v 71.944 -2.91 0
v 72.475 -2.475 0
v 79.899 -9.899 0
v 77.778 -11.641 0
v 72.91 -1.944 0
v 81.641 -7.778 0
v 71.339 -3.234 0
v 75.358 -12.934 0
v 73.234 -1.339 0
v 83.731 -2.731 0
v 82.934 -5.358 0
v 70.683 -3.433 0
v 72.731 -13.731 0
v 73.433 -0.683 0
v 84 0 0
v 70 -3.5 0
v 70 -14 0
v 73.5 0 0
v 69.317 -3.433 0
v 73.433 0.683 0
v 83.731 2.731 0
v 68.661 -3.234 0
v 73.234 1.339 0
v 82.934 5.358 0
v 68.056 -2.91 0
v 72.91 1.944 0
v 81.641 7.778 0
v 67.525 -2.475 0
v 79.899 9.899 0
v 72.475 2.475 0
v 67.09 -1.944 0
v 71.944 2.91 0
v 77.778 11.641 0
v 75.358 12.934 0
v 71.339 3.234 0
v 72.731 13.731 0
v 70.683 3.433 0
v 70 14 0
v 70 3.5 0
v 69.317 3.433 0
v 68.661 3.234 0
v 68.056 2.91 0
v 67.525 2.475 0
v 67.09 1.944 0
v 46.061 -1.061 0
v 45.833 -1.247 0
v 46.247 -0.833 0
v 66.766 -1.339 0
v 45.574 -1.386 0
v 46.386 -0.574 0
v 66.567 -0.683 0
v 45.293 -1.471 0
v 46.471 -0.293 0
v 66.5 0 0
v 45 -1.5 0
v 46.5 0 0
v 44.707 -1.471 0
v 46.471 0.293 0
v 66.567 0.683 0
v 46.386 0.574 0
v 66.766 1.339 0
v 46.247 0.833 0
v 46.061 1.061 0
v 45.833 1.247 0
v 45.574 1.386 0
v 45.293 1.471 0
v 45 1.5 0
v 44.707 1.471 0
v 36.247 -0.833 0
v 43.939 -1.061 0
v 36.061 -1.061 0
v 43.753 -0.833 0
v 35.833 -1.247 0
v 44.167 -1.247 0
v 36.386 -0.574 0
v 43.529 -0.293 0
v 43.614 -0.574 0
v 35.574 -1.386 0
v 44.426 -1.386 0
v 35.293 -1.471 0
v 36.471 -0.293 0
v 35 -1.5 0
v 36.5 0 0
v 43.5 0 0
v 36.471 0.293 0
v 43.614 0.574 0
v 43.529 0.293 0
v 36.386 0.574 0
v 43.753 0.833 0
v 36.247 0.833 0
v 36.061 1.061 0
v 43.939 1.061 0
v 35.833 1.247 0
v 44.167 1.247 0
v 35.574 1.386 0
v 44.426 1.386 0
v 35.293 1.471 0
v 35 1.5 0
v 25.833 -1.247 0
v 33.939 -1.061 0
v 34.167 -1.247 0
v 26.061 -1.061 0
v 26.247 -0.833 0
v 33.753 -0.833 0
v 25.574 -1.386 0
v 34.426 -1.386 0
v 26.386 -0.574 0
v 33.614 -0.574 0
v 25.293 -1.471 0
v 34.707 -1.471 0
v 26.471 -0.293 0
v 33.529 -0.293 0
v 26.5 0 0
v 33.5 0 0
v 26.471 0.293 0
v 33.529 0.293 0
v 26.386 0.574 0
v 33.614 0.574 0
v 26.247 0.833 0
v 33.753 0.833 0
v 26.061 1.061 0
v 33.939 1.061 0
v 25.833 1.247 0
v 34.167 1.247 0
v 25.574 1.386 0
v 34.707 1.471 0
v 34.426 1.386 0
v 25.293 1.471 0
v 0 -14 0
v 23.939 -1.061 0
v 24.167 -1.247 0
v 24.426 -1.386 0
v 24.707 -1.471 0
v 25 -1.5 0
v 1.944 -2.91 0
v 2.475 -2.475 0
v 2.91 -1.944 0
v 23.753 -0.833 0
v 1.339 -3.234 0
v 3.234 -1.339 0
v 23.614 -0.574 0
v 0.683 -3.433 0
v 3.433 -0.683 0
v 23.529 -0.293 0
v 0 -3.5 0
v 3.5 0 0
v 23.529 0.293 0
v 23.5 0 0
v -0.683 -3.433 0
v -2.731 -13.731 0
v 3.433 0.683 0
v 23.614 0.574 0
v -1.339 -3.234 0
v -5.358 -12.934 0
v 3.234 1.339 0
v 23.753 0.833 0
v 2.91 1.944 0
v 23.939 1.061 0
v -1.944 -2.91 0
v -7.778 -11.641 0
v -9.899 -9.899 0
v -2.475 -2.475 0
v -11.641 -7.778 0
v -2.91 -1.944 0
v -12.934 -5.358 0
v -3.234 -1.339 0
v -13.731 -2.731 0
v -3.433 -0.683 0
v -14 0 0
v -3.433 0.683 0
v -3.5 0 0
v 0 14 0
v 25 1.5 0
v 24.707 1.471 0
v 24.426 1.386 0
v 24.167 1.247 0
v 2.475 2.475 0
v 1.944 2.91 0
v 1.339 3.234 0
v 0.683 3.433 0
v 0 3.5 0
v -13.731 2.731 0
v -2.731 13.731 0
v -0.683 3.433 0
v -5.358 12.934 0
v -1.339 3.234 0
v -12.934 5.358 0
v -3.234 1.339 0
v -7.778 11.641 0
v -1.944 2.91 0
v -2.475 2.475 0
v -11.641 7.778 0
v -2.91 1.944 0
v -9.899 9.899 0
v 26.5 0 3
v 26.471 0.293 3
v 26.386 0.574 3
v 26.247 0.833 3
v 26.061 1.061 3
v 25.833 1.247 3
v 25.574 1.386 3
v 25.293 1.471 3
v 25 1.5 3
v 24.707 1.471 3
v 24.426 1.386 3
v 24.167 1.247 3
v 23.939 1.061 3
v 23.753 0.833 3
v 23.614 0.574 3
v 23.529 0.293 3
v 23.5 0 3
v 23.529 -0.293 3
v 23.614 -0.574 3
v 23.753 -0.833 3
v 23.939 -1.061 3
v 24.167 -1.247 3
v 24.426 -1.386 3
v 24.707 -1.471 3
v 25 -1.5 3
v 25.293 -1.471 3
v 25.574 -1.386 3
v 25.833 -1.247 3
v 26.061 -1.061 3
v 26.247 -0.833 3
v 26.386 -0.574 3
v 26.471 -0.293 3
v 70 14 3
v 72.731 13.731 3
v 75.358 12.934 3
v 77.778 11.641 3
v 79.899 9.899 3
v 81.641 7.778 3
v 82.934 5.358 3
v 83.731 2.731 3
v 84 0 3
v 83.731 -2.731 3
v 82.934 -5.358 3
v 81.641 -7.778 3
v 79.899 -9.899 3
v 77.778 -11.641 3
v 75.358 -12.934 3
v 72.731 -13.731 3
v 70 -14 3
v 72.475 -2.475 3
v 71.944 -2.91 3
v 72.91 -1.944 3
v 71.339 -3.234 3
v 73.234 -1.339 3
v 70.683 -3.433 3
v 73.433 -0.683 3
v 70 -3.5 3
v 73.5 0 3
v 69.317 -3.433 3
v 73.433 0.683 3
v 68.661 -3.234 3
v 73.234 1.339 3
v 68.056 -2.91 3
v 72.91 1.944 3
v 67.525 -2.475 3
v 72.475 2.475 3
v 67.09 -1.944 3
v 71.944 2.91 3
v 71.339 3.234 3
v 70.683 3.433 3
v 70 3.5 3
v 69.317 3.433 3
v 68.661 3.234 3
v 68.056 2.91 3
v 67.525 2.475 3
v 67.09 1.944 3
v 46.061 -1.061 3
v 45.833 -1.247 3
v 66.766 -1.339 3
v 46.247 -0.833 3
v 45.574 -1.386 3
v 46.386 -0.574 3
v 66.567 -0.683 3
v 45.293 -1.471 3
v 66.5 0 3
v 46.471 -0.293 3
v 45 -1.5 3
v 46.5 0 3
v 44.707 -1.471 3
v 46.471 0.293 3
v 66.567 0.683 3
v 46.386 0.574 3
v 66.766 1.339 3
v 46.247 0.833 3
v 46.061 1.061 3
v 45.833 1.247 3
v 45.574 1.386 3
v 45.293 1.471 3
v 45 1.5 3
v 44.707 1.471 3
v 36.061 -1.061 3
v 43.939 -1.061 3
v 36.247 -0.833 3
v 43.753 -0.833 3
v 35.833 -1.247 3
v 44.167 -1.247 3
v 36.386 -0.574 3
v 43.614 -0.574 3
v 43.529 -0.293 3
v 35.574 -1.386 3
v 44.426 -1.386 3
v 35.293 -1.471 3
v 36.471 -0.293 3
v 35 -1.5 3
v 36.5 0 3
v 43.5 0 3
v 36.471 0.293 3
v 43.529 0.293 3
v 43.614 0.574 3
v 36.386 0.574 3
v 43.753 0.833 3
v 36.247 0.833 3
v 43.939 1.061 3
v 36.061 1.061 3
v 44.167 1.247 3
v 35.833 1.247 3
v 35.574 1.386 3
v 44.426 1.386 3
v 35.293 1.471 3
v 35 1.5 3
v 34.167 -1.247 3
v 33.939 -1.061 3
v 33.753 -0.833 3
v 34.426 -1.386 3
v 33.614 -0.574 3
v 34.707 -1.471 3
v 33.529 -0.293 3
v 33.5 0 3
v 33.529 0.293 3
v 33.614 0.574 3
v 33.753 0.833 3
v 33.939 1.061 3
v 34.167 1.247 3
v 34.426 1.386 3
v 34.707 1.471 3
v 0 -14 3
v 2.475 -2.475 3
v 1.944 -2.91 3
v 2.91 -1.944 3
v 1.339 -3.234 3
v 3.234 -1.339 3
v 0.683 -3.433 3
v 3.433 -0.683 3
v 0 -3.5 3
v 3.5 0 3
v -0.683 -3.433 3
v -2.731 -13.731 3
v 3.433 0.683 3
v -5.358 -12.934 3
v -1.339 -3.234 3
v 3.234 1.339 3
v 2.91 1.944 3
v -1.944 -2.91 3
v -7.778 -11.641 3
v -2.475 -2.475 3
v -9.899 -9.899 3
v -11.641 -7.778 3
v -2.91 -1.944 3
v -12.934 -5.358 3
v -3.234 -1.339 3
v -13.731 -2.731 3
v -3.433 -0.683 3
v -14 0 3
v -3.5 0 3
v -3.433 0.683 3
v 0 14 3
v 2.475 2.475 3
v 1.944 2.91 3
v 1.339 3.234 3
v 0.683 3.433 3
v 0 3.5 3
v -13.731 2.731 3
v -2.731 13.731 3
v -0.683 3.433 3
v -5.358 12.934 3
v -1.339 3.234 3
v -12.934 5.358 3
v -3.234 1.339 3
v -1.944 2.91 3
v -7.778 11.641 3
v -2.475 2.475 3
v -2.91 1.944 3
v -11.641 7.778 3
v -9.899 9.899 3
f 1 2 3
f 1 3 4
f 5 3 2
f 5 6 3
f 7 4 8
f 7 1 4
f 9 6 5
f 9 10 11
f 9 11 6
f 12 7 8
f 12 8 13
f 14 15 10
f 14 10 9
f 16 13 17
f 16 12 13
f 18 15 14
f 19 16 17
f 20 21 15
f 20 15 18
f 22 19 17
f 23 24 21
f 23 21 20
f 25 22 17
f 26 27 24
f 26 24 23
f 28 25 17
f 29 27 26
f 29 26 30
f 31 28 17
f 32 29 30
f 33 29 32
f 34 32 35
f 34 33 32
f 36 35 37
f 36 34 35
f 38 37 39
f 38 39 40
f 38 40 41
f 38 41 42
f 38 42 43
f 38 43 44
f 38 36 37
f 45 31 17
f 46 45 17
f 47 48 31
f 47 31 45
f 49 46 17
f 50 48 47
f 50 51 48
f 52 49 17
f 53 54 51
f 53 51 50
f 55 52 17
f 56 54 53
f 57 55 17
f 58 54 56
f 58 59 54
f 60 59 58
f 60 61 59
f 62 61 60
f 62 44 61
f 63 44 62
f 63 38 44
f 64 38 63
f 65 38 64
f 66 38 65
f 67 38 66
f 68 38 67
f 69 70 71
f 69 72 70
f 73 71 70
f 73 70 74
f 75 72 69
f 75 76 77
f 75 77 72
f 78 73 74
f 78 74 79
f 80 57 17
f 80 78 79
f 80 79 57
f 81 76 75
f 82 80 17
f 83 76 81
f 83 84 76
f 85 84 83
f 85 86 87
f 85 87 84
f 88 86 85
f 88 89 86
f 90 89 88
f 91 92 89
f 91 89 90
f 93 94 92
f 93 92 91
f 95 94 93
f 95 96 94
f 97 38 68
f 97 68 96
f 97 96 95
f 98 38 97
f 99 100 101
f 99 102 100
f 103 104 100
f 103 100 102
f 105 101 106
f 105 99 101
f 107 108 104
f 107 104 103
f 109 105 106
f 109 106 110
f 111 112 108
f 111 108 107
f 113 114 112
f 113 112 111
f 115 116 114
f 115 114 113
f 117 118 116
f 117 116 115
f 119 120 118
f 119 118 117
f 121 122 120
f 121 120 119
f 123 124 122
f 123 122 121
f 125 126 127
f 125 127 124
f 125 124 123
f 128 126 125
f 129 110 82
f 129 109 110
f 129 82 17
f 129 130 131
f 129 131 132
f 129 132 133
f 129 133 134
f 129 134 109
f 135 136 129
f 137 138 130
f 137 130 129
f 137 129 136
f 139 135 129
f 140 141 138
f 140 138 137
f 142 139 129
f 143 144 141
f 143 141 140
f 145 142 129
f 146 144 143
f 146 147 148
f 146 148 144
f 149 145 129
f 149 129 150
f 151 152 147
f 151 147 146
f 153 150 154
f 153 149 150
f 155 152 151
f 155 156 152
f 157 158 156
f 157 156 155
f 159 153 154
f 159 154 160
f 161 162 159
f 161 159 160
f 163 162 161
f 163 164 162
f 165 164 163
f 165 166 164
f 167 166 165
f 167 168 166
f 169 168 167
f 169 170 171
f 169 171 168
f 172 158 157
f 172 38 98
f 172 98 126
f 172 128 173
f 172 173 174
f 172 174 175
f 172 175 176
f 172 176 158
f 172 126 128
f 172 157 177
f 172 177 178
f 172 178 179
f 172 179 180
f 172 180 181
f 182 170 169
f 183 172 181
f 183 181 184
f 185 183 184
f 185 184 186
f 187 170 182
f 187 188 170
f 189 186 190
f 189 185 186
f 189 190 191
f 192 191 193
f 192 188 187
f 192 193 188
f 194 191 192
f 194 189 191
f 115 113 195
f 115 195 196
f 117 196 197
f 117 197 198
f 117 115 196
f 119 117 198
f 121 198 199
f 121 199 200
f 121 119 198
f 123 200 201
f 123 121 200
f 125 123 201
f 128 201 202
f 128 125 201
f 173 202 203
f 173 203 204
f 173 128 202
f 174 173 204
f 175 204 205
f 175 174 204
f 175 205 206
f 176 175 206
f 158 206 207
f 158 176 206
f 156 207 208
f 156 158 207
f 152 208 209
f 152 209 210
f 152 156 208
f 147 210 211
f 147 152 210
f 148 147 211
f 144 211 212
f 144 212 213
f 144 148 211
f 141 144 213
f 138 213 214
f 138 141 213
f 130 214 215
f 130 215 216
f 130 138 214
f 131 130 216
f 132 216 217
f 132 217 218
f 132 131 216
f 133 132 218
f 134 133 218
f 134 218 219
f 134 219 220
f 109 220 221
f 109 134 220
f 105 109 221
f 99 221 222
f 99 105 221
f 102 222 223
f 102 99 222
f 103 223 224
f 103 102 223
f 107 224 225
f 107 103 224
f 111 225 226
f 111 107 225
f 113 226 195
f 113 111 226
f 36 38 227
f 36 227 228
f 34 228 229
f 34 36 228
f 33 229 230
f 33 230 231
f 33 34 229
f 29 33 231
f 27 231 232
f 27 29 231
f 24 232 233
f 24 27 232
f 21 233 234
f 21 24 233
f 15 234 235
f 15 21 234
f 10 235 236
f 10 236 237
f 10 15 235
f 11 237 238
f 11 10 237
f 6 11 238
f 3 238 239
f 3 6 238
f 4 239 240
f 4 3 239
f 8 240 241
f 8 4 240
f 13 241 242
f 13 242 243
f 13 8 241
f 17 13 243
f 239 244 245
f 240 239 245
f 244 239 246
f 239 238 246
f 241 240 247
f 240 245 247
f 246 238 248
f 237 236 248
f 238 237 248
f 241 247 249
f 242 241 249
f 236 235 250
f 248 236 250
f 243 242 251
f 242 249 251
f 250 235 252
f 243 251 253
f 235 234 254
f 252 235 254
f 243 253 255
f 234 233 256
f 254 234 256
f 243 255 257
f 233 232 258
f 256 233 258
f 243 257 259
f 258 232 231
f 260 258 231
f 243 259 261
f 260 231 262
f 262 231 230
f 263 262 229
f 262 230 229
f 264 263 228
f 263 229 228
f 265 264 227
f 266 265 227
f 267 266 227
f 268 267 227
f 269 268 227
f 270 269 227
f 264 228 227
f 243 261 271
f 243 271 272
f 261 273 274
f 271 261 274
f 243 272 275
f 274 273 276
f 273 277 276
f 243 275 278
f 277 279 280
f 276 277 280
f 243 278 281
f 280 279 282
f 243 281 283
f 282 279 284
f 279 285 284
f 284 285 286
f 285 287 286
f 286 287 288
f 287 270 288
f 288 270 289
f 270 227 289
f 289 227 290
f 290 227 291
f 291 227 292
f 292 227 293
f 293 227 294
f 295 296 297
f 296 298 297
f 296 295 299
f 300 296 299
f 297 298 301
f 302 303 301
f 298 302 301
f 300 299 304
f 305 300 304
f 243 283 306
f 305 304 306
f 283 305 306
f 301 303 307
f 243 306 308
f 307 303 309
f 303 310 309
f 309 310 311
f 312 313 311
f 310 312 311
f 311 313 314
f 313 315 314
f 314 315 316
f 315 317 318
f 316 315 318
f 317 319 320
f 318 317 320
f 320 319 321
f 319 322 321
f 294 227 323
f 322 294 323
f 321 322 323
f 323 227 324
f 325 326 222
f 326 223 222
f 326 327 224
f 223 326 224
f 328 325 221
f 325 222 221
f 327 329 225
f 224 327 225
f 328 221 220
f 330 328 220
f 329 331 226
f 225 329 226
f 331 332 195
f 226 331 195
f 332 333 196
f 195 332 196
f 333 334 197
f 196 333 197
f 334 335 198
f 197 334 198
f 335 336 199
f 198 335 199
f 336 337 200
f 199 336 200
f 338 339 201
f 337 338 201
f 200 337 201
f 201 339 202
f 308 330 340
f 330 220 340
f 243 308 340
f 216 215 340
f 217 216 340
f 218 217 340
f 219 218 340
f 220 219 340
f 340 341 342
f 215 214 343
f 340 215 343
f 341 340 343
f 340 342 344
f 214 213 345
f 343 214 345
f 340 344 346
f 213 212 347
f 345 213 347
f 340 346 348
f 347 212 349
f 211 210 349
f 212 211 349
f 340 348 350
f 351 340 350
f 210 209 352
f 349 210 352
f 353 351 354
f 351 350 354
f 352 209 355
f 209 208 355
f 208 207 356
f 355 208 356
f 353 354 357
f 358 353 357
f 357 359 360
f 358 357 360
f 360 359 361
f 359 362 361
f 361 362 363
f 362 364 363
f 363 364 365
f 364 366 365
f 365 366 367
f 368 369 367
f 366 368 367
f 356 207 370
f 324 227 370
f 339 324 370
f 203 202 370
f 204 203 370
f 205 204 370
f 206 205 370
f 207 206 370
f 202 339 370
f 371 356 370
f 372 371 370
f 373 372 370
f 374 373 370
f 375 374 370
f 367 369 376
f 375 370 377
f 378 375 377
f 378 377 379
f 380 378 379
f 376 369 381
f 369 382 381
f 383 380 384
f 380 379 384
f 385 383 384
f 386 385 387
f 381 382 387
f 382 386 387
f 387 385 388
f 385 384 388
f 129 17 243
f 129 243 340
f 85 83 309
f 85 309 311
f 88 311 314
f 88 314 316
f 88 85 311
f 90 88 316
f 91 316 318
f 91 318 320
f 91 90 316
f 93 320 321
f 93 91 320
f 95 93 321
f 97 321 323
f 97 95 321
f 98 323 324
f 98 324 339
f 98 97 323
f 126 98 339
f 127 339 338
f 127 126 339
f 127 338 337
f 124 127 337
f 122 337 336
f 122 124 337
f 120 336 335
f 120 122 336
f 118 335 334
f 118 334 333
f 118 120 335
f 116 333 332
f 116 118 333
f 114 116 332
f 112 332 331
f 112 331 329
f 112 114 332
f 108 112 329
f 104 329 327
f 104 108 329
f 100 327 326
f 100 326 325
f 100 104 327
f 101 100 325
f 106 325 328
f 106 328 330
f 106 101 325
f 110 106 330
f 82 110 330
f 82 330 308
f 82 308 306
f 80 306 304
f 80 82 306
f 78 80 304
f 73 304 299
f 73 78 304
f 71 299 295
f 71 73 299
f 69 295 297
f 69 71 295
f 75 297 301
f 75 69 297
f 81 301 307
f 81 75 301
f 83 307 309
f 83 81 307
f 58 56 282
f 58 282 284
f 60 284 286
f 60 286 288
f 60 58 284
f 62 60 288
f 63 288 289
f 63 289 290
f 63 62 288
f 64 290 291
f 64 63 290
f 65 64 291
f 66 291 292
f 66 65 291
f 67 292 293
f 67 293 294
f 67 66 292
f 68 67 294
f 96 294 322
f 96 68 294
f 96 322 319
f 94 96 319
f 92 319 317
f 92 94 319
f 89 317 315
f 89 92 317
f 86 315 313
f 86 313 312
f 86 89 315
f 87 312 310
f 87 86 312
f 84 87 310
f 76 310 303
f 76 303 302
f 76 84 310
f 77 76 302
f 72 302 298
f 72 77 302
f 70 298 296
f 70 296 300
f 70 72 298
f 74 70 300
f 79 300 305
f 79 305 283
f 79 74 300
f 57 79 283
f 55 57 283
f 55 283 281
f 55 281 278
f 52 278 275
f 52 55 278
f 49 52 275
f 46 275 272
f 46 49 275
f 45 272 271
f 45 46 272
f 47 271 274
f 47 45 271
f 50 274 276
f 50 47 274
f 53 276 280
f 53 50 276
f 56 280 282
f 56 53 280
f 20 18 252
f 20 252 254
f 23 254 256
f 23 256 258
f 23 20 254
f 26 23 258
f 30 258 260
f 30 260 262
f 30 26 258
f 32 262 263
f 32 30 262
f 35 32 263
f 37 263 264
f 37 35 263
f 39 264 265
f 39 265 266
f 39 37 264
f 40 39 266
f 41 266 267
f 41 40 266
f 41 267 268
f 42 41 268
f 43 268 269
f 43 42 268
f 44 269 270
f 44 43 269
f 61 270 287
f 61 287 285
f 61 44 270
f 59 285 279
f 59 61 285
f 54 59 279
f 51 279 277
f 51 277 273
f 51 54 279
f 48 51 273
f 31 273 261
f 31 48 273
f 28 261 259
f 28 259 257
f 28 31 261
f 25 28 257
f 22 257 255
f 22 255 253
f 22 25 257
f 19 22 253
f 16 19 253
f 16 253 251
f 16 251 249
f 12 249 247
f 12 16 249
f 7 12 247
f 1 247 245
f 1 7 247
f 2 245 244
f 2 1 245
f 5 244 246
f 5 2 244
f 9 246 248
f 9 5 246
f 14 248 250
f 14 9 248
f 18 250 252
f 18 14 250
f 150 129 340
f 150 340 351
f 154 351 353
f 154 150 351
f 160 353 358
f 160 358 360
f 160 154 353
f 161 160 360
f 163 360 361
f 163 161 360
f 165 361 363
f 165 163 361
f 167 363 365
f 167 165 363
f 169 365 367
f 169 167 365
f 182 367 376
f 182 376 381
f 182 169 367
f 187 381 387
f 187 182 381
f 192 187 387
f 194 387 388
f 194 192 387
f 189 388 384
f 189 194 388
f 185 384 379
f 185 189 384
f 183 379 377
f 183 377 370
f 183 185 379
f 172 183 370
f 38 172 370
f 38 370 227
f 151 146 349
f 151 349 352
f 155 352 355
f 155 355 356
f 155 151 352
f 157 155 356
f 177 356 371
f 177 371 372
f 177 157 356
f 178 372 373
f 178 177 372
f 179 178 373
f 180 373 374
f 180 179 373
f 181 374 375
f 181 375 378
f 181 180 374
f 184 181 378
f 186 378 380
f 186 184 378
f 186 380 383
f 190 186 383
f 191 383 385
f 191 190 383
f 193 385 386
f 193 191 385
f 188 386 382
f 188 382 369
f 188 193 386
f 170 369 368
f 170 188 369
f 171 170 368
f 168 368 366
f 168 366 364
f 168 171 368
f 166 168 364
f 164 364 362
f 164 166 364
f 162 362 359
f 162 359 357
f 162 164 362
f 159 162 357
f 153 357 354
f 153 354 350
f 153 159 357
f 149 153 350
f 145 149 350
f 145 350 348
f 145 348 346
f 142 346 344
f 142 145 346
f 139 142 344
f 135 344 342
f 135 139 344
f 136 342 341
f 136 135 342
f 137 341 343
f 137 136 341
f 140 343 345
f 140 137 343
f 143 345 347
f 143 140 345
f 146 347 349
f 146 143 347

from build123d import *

# Parameters (mm, degrees)
SKETCH1_R           = 1.5
SKETCH1_R_2         = 3.5
BOSS_EXTRUDE1_DEPTH = 3


with BuildPart() as part:
    # Sketch1 → Boss-Extrude1 (new body)
    with BuildSketch(Plane.XY):
        with BuildLine():
            Line((0, 14), (70, 14))
            ThreePointArc((70, 14), (84, 0), (70, -14))
            Line((70, -14), (0, -14))
            ThreePointArc((0, -14), (-14, 0), (0, 14))
        make_face()
        with Locations((25, 0)):
            Circle(SKETCH1_R, mode=Mode.SUBTRACT)
        Circle(SKETCH1_R_2, mode=Mode.SUBTRACT)
        with Locations((35, 0)):
            Circle(SKETCH1_R, mode=Mode.SUBTRACT)
        with Locations((45, 0)):
            Circle(SKETCH1_R, mode=Mode.SUBTRACT)
        with Locations((70, 0)):
            Circle(SKETCH1_R_2, mode=Mode.SUBTRACT)
    extrude(amount=BOSS_EXTRUDE1_DEPTH)


solid = part.part
